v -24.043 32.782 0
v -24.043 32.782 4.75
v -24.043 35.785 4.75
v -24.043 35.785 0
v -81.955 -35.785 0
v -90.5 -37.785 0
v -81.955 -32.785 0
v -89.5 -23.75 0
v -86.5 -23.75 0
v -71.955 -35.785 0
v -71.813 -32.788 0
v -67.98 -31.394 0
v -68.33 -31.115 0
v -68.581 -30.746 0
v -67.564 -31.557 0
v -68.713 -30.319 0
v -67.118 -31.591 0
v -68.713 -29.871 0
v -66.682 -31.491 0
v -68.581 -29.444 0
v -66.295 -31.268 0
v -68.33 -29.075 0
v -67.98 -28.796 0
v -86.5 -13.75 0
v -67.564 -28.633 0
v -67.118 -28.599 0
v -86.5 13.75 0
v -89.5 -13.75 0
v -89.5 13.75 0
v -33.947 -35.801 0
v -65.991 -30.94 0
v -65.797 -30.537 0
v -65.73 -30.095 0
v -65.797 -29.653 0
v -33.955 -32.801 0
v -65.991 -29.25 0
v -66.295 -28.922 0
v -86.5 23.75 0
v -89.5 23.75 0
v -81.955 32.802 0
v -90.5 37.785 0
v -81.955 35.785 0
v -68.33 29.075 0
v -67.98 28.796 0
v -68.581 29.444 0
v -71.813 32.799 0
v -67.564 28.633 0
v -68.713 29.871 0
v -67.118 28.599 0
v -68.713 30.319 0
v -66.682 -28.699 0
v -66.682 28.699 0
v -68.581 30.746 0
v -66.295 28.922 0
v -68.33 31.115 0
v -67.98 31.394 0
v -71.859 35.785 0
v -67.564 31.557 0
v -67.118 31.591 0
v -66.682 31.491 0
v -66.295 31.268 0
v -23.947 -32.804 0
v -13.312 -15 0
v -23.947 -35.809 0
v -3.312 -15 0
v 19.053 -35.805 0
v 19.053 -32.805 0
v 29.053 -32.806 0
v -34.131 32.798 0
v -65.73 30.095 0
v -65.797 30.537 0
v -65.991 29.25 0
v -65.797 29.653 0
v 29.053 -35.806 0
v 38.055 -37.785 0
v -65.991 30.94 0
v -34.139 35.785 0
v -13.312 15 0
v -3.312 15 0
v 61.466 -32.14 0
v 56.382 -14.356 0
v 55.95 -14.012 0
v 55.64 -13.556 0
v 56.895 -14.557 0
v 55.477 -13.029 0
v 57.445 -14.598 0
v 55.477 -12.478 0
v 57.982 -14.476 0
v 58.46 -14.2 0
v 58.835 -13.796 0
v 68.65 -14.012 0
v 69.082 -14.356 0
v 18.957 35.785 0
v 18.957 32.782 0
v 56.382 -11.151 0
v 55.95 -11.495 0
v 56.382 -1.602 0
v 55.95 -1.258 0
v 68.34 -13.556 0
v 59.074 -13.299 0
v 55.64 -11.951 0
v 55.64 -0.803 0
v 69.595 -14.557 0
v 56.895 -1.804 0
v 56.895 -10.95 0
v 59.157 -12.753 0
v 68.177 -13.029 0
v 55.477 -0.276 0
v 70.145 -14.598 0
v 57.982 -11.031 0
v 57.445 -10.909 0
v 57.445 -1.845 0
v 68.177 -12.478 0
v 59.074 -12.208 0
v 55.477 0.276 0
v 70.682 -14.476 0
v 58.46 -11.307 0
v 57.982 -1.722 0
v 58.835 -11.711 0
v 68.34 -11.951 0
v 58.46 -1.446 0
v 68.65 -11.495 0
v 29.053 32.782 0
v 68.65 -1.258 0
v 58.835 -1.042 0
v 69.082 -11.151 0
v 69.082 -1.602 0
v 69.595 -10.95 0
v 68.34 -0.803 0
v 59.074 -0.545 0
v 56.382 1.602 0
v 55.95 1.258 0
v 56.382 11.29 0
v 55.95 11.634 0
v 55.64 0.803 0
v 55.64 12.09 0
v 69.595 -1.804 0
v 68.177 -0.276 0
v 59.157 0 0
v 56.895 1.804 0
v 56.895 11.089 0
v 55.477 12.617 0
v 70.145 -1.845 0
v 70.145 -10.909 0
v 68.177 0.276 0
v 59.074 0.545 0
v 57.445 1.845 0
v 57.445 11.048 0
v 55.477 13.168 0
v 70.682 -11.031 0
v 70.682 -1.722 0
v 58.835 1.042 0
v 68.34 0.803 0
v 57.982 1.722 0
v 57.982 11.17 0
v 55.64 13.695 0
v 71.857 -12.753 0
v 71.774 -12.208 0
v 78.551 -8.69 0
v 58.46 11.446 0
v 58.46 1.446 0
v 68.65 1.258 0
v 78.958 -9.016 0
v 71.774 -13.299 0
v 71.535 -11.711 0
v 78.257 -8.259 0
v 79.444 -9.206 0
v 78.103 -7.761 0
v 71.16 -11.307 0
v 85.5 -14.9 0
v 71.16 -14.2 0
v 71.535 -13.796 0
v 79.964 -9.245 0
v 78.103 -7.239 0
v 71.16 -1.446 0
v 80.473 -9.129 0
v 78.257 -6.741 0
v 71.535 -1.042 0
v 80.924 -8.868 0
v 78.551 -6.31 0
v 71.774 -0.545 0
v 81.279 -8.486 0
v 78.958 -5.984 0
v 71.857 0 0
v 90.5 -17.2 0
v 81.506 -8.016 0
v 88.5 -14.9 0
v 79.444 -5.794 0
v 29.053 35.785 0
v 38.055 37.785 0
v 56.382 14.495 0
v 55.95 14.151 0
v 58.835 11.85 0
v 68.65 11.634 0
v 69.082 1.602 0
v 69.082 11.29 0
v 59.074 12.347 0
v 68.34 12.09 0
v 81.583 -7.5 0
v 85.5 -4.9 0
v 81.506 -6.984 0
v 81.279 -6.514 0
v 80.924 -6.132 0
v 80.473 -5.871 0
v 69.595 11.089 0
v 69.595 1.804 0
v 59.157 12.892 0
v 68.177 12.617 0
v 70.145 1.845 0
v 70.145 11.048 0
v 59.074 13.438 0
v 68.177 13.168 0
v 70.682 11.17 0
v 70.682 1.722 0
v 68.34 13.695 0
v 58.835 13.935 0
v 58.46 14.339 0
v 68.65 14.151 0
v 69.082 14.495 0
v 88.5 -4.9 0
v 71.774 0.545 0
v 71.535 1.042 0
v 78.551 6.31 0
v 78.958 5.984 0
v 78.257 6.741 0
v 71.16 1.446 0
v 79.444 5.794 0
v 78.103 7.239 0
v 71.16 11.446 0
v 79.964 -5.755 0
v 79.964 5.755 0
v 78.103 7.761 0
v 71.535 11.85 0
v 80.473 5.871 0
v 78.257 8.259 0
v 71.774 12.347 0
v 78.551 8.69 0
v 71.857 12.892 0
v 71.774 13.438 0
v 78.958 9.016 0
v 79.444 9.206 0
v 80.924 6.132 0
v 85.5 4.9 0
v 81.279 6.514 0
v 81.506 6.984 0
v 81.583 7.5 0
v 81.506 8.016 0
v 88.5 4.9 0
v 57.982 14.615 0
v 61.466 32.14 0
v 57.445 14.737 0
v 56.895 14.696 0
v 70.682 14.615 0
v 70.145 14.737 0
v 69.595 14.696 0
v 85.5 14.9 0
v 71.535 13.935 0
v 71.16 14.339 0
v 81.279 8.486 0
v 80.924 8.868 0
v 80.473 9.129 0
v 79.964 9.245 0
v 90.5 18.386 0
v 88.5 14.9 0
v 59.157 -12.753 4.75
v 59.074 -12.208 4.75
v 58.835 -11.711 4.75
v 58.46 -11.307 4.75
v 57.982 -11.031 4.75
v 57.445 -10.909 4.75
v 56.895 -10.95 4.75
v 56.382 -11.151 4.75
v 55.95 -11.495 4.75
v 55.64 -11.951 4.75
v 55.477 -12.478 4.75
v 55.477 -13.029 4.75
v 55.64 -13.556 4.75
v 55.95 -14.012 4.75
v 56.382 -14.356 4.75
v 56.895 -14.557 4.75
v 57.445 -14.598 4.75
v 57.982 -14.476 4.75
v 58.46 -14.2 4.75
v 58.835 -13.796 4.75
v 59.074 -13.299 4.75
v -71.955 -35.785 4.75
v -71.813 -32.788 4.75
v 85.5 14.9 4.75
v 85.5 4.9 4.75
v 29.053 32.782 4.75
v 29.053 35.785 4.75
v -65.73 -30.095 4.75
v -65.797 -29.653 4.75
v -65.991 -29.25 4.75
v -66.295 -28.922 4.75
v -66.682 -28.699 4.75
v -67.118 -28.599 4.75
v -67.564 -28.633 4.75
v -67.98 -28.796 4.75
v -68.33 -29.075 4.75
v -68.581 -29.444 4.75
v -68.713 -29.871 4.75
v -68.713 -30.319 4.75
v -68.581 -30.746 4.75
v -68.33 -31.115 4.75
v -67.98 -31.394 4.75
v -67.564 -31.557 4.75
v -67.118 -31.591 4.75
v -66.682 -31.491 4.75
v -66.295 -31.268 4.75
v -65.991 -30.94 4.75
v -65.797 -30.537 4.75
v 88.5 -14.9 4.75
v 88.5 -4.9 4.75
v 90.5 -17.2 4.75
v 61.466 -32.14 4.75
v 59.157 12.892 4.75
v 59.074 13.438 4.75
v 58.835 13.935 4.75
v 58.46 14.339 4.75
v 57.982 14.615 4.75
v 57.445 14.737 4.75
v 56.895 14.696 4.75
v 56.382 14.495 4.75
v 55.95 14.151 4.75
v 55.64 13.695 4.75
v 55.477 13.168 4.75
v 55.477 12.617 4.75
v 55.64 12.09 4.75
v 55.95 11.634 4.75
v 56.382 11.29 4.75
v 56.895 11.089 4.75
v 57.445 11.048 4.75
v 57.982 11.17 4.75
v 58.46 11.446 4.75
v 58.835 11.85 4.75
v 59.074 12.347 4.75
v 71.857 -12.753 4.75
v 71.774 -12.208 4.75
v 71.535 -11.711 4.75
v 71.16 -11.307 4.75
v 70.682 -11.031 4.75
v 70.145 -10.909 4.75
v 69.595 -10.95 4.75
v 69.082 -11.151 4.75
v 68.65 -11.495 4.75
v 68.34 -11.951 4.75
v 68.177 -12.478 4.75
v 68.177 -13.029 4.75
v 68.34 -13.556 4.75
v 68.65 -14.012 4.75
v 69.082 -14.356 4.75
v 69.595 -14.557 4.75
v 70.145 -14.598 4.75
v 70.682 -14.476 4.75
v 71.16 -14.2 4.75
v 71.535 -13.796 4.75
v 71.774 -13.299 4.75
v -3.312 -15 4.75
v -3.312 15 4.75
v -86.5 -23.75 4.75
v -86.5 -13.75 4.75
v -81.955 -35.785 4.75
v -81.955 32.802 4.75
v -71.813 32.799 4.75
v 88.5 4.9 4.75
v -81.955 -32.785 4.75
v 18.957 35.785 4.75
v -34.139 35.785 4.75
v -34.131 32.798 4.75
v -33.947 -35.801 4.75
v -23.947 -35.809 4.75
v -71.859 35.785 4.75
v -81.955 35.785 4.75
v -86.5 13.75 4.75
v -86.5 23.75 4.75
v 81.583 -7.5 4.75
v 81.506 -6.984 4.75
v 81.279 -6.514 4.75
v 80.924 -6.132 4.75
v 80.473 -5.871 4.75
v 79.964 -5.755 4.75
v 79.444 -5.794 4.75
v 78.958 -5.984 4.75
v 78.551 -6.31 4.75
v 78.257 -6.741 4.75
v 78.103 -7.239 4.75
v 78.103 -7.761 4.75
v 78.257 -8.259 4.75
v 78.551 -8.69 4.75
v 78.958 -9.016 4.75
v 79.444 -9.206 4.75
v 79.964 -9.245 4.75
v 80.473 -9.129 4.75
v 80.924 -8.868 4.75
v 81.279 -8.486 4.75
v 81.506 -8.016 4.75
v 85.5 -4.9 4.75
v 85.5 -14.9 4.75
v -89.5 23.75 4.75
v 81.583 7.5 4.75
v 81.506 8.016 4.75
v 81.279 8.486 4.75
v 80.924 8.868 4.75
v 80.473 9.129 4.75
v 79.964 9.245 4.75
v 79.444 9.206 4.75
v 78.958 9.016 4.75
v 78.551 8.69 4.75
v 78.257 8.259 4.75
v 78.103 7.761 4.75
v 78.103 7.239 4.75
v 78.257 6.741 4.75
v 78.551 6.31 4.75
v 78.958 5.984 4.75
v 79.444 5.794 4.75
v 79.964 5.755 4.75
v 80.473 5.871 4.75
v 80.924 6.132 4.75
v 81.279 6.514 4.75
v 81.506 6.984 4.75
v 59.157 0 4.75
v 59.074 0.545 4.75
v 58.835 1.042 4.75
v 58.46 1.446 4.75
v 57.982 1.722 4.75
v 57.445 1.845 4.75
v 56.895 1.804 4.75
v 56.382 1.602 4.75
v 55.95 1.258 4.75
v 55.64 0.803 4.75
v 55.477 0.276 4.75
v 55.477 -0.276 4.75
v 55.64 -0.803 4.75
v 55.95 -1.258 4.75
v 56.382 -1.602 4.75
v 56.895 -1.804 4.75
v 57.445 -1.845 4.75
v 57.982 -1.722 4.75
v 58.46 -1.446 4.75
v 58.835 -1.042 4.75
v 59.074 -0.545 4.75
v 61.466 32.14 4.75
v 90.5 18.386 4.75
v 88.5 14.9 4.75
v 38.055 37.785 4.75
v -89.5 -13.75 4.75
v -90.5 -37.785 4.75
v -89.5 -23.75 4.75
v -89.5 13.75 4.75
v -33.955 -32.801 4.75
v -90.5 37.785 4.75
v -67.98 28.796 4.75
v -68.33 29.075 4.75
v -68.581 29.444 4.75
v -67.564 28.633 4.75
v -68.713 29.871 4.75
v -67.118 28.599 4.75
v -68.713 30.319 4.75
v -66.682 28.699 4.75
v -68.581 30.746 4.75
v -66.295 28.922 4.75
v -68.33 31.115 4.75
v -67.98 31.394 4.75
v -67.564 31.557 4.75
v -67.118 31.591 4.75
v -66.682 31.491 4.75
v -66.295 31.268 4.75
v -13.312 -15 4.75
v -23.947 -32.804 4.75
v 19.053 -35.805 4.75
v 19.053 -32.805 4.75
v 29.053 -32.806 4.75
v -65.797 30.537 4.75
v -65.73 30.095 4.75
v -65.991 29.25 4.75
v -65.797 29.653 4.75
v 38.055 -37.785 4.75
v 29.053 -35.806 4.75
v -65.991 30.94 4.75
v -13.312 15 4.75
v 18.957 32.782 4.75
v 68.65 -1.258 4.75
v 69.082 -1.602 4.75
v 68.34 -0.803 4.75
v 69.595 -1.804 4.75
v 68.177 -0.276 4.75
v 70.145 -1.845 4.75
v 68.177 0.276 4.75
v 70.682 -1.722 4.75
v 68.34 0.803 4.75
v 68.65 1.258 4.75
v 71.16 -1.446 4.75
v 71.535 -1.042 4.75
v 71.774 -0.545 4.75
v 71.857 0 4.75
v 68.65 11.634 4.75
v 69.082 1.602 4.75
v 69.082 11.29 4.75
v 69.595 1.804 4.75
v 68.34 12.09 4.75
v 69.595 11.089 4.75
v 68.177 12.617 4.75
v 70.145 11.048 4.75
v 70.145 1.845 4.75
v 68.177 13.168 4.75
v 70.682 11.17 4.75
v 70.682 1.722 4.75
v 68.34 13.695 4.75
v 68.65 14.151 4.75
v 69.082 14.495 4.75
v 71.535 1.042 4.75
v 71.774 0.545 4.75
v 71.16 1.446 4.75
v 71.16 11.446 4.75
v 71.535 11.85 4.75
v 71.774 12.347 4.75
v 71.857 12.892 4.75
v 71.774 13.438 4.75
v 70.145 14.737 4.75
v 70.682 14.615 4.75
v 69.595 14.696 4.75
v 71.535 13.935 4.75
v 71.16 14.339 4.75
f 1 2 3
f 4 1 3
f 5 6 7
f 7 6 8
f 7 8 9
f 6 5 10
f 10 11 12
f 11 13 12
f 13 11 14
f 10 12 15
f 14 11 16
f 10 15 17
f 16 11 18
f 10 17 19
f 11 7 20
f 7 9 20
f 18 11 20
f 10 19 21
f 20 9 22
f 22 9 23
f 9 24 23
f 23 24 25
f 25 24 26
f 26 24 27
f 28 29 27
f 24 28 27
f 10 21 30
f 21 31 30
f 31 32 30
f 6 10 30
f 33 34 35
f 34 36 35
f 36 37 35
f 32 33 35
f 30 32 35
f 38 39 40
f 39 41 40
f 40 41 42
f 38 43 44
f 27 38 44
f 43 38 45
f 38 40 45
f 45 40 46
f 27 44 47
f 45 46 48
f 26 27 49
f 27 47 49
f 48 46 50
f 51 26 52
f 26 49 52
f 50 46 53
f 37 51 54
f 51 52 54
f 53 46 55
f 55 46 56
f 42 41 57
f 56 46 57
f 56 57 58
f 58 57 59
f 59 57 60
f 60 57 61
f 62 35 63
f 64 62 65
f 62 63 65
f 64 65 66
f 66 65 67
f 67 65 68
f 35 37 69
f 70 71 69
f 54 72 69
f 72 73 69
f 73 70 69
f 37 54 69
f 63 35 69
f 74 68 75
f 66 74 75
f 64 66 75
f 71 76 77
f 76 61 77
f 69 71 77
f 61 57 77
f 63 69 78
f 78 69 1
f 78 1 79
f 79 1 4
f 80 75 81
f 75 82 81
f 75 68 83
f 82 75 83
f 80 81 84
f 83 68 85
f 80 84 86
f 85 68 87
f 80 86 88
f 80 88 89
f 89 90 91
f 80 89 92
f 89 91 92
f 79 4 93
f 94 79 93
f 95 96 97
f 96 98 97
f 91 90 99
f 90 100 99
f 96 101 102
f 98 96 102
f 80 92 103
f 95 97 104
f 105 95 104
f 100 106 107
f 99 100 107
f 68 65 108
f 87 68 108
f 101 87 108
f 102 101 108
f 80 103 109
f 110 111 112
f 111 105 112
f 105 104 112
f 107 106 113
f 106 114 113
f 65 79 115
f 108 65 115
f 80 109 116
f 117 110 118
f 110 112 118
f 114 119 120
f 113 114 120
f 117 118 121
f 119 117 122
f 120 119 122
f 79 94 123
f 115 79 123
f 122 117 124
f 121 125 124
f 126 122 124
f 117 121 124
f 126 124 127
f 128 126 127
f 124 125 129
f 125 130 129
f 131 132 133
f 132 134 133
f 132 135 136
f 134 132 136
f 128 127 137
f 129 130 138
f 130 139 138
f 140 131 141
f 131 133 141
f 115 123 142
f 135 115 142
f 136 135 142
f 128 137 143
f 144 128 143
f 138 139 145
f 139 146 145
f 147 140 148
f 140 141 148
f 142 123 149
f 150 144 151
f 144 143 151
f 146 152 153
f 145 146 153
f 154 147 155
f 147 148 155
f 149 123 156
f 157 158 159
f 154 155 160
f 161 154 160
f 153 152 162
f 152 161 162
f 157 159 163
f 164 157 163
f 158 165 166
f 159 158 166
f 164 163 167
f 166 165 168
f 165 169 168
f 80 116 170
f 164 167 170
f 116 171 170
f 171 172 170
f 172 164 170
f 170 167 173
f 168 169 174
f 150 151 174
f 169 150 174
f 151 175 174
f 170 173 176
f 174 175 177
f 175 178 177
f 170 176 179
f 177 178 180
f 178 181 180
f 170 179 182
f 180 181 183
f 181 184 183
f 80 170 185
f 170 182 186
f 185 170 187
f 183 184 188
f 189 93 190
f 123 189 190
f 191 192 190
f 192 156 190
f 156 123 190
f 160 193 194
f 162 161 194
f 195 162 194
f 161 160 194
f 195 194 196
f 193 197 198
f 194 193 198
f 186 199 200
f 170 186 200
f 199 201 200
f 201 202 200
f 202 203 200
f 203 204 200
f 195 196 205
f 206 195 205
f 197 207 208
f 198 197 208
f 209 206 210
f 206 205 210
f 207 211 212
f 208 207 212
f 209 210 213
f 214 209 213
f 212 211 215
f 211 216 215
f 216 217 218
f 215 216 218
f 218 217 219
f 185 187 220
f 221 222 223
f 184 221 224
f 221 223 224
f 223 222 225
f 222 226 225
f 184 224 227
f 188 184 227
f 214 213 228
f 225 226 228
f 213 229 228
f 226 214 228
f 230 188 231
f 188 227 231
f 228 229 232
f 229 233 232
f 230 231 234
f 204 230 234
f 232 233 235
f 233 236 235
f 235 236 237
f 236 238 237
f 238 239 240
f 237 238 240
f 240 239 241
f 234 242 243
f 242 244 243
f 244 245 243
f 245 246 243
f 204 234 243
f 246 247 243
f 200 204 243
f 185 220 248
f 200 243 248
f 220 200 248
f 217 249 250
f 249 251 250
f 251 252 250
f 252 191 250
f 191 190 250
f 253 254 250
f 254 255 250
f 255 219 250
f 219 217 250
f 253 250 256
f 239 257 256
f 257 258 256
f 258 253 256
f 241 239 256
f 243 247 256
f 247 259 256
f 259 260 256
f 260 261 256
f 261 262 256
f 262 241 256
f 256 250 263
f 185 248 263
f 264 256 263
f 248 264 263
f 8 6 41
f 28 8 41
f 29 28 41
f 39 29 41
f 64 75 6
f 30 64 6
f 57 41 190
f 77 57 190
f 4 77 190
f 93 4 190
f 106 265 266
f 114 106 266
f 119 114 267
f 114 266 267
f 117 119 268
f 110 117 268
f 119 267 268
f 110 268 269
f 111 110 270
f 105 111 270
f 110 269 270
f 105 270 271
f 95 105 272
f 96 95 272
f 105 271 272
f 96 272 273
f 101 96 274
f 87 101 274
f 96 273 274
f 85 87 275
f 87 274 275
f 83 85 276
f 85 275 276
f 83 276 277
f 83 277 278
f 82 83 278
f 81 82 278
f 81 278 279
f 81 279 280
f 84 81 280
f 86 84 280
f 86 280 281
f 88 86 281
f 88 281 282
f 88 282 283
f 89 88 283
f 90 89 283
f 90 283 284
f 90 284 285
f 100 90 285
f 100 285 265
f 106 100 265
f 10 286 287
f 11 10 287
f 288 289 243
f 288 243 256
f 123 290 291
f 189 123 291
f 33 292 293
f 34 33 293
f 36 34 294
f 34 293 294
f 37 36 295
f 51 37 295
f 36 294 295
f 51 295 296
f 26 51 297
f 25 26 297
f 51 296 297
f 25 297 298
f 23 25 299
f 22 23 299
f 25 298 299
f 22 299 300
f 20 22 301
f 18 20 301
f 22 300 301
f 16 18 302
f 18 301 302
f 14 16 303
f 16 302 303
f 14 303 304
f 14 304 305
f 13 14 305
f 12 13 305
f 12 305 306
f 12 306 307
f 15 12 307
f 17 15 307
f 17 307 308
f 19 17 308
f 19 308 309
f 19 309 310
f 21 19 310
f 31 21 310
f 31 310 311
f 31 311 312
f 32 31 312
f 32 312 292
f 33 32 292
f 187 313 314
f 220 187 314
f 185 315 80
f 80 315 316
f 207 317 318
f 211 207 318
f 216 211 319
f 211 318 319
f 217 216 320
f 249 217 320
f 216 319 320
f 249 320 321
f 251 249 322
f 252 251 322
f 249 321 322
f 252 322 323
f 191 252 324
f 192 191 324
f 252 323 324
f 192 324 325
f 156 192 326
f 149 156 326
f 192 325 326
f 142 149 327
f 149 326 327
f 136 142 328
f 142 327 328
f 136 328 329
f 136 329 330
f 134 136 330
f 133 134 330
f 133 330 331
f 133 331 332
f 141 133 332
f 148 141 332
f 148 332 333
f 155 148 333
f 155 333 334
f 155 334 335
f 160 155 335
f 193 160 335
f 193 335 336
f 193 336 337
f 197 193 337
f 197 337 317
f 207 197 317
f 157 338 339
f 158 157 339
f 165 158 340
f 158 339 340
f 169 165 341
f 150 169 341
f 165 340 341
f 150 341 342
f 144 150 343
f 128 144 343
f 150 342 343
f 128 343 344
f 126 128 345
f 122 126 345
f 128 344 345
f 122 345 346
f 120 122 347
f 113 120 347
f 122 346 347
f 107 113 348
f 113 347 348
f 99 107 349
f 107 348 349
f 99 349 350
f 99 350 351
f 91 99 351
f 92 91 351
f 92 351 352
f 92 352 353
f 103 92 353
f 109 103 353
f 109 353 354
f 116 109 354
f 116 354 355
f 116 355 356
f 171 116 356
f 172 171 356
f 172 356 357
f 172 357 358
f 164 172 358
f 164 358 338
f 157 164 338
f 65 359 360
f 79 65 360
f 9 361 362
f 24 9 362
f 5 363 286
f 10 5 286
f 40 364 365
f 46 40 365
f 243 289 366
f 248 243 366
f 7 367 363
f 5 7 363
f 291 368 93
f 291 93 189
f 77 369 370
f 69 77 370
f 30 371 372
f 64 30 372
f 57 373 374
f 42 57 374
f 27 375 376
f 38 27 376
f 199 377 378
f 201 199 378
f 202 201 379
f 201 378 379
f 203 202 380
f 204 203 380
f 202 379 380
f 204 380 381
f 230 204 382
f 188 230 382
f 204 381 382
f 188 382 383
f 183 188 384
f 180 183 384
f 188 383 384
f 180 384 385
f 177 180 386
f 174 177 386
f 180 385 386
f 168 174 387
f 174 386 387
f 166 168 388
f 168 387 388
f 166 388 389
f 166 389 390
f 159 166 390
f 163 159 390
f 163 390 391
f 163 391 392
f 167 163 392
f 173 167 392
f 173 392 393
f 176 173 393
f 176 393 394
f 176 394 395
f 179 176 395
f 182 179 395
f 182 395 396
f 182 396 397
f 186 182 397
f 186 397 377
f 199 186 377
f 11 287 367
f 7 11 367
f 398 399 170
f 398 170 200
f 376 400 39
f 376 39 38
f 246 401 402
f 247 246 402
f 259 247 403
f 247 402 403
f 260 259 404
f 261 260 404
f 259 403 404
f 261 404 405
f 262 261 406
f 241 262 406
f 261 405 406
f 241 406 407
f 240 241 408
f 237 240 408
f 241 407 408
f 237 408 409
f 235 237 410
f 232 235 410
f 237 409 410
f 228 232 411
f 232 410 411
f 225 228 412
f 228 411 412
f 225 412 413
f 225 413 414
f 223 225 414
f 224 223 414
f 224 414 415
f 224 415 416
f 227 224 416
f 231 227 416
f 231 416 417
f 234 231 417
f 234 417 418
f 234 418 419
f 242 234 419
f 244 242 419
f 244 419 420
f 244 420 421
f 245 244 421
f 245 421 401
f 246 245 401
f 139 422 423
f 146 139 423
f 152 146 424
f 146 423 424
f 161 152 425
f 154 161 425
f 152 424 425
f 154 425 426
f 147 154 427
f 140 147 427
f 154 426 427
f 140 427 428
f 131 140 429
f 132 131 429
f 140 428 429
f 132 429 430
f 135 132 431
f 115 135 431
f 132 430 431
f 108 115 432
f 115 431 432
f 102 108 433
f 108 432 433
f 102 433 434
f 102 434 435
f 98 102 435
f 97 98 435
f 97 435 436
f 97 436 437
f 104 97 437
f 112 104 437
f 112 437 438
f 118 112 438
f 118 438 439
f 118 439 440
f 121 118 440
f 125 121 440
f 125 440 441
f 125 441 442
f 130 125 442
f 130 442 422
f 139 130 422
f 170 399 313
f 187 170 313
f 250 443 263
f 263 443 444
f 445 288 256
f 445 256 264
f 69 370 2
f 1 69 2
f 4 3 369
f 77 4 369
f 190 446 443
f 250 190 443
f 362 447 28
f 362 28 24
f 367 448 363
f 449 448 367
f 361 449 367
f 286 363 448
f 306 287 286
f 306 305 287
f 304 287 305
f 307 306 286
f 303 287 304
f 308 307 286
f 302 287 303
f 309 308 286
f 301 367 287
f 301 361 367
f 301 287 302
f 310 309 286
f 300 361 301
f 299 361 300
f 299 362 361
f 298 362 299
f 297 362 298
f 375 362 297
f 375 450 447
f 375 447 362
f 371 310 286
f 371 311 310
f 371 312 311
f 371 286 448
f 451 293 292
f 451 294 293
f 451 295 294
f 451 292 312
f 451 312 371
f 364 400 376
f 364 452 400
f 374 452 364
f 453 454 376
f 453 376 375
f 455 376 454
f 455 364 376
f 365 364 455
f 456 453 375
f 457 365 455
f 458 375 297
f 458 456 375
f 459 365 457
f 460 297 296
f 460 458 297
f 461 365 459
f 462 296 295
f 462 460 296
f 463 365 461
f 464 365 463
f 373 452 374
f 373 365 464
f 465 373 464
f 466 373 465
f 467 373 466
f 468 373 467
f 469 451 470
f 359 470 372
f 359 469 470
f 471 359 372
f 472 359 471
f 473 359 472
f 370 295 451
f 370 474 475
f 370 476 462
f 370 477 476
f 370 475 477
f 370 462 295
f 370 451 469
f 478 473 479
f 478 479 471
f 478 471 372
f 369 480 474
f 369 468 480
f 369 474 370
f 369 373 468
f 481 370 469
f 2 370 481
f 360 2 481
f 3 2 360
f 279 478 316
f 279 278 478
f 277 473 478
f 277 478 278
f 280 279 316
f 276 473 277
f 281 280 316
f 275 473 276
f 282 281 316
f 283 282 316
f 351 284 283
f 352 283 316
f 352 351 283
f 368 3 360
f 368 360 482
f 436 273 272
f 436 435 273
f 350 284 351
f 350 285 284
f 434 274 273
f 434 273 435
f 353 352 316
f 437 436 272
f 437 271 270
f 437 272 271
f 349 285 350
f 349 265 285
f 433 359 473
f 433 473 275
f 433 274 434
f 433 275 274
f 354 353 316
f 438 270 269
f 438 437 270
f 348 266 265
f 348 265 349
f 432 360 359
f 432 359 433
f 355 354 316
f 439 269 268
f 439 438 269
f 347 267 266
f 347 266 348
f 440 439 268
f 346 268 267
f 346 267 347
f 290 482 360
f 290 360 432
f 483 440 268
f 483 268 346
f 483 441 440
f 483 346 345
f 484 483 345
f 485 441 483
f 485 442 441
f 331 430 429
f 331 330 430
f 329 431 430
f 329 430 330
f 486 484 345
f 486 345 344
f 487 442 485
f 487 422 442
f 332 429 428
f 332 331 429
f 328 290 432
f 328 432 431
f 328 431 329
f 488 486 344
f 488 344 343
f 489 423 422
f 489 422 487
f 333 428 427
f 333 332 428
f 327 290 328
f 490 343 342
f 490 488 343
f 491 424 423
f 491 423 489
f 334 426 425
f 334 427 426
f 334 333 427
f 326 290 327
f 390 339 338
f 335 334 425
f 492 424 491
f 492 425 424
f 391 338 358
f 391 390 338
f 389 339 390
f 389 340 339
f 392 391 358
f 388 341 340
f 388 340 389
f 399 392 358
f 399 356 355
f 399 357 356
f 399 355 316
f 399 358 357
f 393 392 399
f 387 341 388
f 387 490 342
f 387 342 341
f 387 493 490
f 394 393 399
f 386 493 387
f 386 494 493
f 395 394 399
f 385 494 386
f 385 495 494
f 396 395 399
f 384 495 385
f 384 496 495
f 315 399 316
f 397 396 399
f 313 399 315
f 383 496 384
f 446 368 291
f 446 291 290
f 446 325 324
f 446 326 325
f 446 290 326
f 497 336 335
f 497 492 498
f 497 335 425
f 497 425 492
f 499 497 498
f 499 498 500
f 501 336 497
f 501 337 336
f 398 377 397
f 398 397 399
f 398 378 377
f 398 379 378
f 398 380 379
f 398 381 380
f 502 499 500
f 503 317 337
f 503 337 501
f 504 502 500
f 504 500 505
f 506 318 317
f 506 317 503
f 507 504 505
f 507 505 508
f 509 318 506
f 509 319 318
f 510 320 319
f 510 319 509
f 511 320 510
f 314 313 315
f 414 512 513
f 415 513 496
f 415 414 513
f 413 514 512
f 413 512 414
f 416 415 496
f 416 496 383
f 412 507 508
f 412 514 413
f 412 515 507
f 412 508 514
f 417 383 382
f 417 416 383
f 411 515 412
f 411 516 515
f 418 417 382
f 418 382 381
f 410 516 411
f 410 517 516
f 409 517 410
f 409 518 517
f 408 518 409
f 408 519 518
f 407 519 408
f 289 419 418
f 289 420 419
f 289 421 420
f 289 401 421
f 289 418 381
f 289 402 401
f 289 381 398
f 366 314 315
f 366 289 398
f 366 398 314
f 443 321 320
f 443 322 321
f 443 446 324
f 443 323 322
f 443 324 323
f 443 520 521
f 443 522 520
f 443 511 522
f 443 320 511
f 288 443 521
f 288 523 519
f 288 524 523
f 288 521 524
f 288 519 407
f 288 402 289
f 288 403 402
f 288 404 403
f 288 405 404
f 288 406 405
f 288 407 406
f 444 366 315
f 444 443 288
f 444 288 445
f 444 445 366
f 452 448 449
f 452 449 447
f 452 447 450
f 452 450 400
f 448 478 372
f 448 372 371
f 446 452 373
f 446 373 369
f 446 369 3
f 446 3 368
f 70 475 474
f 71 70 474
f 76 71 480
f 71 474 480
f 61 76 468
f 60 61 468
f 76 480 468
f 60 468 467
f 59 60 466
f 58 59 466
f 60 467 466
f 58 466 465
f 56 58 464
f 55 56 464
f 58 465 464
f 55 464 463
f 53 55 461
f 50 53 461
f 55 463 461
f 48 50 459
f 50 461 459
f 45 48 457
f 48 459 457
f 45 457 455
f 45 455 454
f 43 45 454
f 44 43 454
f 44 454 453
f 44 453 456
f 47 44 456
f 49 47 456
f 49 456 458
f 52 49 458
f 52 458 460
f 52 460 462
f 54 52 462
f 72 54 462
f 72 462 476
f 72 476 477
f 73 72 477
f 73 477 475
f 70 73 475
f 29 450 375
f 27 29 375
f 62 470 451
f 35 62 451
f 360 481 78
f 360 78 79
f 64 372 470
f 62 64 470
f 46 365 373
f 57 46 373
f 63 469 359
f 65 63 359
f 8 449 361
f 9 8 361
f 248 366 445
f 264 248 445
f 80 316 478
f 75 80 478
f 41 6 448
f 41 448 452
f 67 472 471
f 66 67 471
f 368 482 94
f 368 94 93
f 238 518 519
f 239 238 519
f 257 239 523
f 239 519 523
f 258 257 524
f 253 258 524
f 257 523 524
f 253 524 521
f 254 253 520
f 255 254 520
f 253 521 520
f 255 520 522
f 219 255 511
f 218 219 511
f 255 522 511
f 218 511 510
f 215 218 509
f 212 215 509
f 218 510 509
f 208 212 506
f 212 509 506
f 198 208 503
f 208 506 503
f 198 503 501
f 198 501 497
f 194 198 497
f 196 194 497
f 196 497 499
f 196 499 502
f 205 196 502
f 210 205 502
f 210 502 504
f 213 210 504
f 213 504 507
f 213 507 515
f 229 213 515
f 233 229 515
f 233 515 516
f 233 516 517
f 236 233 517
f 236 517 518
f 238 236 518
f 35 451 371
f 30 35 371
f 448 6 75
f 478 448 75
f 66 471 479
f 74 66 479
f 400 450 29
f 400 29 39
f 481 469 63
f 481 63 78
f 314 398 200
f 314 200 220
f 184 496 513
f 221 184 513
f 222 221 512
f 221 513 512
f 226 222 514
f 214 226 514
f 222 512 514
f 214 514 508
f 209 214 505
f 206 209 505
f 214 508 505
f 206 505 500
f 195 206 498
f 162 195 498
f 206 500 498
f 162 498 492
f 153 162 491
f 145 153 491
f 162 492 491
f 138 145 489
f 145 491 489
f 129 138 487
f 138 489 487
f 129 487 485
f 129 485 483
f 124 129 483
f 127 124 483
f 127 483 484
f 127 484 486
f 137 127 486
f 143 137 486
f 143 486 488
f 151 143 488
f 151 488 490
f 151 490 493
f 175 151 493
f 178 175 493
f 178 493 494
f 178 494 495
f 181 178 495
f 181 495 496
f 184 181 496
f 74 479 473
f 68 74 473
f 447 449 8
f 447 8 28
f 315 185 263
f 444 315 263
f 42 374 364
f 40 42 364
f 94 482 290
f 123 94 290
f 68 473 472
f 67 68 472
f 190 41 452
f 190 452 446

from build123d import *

# Parameters (mm, degrees)
SKETCH1_W           = 181
SKETCH1_H           = 75.57
BOSS_EXTRUDE2_DEPTH = 4.75
SKETCH6_W           = 3
SKETCH6_H           = 10
SKETCH6_W_2         = 10.095812656
SKETCH6_H_2         = 3.003442242
SKETCH6_W_3         = 10
SKETCH6_H_3         = 30
SKETCH6_R           = 1.5
SKETCH6_R_2         = 1.85
SKETCH6_R_3         = 1.75
CUT_EXTRUDE7_DEPTH  = 9


with BuildPart() as part:
    # Sketch1 → Boss-Extrude2 (new body)
    with BuildSketch(Plane.XY):
        Rectangle(SKETCH1_W, SKETCH1_H)
    extrude(amount=BOSS_EXTRUDE2_DEPTH)

    # Sketch6 → Cut-Extrude7 (cut)
    with BuildSketch(Plane.XY.offset(4.75)):
        Polygon((-81.955185068, 35.785), (-81.955183992, 32.802018857), (-71.81277502, 32.798644215), (-71.859372412, 35.785), align=None)
        with Locations((-88, 18.75)):
            Rectangle(SKETCH6_W, SKETCH6_H)
        with Locations((-88, -18.75)):
            Rectangle(SKETCH6_W, SKETCH6_H)
        Polygon((-34.13878131, 35.785), (-34.130786214, 32.798291399), (-24.042968654, 32.781557758), (-24.042968654, 35.785), align=None)
        Polygon((-71.81277502, -32.788413815), (-81.955183992, -32.785039173), (-81.955181828, -35.785039173), (-71.955181828, -35.785031959), align=None)
        Polygon((-33.95518398, -32.801010013), (-33.947153334, -35.800999264), (-23.947156396, -35.808824865), (-23.946905936, -32.804340026), align=None)
        with Locations((87, 9.9)):
            Rectangle(SKETCH6_W, SKETCH6_H)
        with Locations((24.004937674, 34.283278879)):
            Rectangle(SKETCH6_W_2, SKETCH6_H_2)
        Polygon((29.052844002, -32.806257253), (19.053094123, -32.805423656), (19.052844037, -35.805423646), (29.052844002, -35.806257264), align=None)
        with Locations((-8.31156853, 0)):
            Rectangle(SKETCH6_W_3, SKETCH6_H_3)
        with Locations((87, -9.9)):
            Rectangle(SKETCH6_W, SKETCH6_H)
        Polygon((61.466273892, -32.14), (38.055212144, -37.785), (90.5, -37.785), (90.5, -17.2), align=None)
        Polygon((61.46627389, 32.14), (90.5, 18.385572572), (90.5, 37.785), (38.055212144, 37.785), align=None)
        with Locations((-67.23, 30.095)):
            Circle(SKETCH6_R)
        with Locations((-67.23, -30.095)):
            Circle(SKETCH6_R)
        with Locations((70.00651733, -12.753407437)):
            Circle(SKETCH6_R_2)
        with Locations((70.00651733, 12.892480558)):
            Circle(SKETCH6_R_2)
        with Locations((70.00651733, 0)):
            Circle(SKETCH6_R_2)
        with Locations((57.30651733, 12.892480558)):
            Circle(SKETCH6_R_2)
        with Locations((57.30651733, 0)):
            Circle(SKETCH6_R_2)
        with Locations((57.30651733, -12.753407437)):
            Circle(SKETCH6_R_2)
        with Locations((79.833359723, -7.5)):
            Circle(SKETCH6_R_3)
        with Locations((79.833359723, 7.5)):
            Circle(SKETCH6_R_3)
    extrude(amount=-CUT_EXTRUDE7_DEPTH, mode=Mode.SUBTRACT)


solid = part.part
